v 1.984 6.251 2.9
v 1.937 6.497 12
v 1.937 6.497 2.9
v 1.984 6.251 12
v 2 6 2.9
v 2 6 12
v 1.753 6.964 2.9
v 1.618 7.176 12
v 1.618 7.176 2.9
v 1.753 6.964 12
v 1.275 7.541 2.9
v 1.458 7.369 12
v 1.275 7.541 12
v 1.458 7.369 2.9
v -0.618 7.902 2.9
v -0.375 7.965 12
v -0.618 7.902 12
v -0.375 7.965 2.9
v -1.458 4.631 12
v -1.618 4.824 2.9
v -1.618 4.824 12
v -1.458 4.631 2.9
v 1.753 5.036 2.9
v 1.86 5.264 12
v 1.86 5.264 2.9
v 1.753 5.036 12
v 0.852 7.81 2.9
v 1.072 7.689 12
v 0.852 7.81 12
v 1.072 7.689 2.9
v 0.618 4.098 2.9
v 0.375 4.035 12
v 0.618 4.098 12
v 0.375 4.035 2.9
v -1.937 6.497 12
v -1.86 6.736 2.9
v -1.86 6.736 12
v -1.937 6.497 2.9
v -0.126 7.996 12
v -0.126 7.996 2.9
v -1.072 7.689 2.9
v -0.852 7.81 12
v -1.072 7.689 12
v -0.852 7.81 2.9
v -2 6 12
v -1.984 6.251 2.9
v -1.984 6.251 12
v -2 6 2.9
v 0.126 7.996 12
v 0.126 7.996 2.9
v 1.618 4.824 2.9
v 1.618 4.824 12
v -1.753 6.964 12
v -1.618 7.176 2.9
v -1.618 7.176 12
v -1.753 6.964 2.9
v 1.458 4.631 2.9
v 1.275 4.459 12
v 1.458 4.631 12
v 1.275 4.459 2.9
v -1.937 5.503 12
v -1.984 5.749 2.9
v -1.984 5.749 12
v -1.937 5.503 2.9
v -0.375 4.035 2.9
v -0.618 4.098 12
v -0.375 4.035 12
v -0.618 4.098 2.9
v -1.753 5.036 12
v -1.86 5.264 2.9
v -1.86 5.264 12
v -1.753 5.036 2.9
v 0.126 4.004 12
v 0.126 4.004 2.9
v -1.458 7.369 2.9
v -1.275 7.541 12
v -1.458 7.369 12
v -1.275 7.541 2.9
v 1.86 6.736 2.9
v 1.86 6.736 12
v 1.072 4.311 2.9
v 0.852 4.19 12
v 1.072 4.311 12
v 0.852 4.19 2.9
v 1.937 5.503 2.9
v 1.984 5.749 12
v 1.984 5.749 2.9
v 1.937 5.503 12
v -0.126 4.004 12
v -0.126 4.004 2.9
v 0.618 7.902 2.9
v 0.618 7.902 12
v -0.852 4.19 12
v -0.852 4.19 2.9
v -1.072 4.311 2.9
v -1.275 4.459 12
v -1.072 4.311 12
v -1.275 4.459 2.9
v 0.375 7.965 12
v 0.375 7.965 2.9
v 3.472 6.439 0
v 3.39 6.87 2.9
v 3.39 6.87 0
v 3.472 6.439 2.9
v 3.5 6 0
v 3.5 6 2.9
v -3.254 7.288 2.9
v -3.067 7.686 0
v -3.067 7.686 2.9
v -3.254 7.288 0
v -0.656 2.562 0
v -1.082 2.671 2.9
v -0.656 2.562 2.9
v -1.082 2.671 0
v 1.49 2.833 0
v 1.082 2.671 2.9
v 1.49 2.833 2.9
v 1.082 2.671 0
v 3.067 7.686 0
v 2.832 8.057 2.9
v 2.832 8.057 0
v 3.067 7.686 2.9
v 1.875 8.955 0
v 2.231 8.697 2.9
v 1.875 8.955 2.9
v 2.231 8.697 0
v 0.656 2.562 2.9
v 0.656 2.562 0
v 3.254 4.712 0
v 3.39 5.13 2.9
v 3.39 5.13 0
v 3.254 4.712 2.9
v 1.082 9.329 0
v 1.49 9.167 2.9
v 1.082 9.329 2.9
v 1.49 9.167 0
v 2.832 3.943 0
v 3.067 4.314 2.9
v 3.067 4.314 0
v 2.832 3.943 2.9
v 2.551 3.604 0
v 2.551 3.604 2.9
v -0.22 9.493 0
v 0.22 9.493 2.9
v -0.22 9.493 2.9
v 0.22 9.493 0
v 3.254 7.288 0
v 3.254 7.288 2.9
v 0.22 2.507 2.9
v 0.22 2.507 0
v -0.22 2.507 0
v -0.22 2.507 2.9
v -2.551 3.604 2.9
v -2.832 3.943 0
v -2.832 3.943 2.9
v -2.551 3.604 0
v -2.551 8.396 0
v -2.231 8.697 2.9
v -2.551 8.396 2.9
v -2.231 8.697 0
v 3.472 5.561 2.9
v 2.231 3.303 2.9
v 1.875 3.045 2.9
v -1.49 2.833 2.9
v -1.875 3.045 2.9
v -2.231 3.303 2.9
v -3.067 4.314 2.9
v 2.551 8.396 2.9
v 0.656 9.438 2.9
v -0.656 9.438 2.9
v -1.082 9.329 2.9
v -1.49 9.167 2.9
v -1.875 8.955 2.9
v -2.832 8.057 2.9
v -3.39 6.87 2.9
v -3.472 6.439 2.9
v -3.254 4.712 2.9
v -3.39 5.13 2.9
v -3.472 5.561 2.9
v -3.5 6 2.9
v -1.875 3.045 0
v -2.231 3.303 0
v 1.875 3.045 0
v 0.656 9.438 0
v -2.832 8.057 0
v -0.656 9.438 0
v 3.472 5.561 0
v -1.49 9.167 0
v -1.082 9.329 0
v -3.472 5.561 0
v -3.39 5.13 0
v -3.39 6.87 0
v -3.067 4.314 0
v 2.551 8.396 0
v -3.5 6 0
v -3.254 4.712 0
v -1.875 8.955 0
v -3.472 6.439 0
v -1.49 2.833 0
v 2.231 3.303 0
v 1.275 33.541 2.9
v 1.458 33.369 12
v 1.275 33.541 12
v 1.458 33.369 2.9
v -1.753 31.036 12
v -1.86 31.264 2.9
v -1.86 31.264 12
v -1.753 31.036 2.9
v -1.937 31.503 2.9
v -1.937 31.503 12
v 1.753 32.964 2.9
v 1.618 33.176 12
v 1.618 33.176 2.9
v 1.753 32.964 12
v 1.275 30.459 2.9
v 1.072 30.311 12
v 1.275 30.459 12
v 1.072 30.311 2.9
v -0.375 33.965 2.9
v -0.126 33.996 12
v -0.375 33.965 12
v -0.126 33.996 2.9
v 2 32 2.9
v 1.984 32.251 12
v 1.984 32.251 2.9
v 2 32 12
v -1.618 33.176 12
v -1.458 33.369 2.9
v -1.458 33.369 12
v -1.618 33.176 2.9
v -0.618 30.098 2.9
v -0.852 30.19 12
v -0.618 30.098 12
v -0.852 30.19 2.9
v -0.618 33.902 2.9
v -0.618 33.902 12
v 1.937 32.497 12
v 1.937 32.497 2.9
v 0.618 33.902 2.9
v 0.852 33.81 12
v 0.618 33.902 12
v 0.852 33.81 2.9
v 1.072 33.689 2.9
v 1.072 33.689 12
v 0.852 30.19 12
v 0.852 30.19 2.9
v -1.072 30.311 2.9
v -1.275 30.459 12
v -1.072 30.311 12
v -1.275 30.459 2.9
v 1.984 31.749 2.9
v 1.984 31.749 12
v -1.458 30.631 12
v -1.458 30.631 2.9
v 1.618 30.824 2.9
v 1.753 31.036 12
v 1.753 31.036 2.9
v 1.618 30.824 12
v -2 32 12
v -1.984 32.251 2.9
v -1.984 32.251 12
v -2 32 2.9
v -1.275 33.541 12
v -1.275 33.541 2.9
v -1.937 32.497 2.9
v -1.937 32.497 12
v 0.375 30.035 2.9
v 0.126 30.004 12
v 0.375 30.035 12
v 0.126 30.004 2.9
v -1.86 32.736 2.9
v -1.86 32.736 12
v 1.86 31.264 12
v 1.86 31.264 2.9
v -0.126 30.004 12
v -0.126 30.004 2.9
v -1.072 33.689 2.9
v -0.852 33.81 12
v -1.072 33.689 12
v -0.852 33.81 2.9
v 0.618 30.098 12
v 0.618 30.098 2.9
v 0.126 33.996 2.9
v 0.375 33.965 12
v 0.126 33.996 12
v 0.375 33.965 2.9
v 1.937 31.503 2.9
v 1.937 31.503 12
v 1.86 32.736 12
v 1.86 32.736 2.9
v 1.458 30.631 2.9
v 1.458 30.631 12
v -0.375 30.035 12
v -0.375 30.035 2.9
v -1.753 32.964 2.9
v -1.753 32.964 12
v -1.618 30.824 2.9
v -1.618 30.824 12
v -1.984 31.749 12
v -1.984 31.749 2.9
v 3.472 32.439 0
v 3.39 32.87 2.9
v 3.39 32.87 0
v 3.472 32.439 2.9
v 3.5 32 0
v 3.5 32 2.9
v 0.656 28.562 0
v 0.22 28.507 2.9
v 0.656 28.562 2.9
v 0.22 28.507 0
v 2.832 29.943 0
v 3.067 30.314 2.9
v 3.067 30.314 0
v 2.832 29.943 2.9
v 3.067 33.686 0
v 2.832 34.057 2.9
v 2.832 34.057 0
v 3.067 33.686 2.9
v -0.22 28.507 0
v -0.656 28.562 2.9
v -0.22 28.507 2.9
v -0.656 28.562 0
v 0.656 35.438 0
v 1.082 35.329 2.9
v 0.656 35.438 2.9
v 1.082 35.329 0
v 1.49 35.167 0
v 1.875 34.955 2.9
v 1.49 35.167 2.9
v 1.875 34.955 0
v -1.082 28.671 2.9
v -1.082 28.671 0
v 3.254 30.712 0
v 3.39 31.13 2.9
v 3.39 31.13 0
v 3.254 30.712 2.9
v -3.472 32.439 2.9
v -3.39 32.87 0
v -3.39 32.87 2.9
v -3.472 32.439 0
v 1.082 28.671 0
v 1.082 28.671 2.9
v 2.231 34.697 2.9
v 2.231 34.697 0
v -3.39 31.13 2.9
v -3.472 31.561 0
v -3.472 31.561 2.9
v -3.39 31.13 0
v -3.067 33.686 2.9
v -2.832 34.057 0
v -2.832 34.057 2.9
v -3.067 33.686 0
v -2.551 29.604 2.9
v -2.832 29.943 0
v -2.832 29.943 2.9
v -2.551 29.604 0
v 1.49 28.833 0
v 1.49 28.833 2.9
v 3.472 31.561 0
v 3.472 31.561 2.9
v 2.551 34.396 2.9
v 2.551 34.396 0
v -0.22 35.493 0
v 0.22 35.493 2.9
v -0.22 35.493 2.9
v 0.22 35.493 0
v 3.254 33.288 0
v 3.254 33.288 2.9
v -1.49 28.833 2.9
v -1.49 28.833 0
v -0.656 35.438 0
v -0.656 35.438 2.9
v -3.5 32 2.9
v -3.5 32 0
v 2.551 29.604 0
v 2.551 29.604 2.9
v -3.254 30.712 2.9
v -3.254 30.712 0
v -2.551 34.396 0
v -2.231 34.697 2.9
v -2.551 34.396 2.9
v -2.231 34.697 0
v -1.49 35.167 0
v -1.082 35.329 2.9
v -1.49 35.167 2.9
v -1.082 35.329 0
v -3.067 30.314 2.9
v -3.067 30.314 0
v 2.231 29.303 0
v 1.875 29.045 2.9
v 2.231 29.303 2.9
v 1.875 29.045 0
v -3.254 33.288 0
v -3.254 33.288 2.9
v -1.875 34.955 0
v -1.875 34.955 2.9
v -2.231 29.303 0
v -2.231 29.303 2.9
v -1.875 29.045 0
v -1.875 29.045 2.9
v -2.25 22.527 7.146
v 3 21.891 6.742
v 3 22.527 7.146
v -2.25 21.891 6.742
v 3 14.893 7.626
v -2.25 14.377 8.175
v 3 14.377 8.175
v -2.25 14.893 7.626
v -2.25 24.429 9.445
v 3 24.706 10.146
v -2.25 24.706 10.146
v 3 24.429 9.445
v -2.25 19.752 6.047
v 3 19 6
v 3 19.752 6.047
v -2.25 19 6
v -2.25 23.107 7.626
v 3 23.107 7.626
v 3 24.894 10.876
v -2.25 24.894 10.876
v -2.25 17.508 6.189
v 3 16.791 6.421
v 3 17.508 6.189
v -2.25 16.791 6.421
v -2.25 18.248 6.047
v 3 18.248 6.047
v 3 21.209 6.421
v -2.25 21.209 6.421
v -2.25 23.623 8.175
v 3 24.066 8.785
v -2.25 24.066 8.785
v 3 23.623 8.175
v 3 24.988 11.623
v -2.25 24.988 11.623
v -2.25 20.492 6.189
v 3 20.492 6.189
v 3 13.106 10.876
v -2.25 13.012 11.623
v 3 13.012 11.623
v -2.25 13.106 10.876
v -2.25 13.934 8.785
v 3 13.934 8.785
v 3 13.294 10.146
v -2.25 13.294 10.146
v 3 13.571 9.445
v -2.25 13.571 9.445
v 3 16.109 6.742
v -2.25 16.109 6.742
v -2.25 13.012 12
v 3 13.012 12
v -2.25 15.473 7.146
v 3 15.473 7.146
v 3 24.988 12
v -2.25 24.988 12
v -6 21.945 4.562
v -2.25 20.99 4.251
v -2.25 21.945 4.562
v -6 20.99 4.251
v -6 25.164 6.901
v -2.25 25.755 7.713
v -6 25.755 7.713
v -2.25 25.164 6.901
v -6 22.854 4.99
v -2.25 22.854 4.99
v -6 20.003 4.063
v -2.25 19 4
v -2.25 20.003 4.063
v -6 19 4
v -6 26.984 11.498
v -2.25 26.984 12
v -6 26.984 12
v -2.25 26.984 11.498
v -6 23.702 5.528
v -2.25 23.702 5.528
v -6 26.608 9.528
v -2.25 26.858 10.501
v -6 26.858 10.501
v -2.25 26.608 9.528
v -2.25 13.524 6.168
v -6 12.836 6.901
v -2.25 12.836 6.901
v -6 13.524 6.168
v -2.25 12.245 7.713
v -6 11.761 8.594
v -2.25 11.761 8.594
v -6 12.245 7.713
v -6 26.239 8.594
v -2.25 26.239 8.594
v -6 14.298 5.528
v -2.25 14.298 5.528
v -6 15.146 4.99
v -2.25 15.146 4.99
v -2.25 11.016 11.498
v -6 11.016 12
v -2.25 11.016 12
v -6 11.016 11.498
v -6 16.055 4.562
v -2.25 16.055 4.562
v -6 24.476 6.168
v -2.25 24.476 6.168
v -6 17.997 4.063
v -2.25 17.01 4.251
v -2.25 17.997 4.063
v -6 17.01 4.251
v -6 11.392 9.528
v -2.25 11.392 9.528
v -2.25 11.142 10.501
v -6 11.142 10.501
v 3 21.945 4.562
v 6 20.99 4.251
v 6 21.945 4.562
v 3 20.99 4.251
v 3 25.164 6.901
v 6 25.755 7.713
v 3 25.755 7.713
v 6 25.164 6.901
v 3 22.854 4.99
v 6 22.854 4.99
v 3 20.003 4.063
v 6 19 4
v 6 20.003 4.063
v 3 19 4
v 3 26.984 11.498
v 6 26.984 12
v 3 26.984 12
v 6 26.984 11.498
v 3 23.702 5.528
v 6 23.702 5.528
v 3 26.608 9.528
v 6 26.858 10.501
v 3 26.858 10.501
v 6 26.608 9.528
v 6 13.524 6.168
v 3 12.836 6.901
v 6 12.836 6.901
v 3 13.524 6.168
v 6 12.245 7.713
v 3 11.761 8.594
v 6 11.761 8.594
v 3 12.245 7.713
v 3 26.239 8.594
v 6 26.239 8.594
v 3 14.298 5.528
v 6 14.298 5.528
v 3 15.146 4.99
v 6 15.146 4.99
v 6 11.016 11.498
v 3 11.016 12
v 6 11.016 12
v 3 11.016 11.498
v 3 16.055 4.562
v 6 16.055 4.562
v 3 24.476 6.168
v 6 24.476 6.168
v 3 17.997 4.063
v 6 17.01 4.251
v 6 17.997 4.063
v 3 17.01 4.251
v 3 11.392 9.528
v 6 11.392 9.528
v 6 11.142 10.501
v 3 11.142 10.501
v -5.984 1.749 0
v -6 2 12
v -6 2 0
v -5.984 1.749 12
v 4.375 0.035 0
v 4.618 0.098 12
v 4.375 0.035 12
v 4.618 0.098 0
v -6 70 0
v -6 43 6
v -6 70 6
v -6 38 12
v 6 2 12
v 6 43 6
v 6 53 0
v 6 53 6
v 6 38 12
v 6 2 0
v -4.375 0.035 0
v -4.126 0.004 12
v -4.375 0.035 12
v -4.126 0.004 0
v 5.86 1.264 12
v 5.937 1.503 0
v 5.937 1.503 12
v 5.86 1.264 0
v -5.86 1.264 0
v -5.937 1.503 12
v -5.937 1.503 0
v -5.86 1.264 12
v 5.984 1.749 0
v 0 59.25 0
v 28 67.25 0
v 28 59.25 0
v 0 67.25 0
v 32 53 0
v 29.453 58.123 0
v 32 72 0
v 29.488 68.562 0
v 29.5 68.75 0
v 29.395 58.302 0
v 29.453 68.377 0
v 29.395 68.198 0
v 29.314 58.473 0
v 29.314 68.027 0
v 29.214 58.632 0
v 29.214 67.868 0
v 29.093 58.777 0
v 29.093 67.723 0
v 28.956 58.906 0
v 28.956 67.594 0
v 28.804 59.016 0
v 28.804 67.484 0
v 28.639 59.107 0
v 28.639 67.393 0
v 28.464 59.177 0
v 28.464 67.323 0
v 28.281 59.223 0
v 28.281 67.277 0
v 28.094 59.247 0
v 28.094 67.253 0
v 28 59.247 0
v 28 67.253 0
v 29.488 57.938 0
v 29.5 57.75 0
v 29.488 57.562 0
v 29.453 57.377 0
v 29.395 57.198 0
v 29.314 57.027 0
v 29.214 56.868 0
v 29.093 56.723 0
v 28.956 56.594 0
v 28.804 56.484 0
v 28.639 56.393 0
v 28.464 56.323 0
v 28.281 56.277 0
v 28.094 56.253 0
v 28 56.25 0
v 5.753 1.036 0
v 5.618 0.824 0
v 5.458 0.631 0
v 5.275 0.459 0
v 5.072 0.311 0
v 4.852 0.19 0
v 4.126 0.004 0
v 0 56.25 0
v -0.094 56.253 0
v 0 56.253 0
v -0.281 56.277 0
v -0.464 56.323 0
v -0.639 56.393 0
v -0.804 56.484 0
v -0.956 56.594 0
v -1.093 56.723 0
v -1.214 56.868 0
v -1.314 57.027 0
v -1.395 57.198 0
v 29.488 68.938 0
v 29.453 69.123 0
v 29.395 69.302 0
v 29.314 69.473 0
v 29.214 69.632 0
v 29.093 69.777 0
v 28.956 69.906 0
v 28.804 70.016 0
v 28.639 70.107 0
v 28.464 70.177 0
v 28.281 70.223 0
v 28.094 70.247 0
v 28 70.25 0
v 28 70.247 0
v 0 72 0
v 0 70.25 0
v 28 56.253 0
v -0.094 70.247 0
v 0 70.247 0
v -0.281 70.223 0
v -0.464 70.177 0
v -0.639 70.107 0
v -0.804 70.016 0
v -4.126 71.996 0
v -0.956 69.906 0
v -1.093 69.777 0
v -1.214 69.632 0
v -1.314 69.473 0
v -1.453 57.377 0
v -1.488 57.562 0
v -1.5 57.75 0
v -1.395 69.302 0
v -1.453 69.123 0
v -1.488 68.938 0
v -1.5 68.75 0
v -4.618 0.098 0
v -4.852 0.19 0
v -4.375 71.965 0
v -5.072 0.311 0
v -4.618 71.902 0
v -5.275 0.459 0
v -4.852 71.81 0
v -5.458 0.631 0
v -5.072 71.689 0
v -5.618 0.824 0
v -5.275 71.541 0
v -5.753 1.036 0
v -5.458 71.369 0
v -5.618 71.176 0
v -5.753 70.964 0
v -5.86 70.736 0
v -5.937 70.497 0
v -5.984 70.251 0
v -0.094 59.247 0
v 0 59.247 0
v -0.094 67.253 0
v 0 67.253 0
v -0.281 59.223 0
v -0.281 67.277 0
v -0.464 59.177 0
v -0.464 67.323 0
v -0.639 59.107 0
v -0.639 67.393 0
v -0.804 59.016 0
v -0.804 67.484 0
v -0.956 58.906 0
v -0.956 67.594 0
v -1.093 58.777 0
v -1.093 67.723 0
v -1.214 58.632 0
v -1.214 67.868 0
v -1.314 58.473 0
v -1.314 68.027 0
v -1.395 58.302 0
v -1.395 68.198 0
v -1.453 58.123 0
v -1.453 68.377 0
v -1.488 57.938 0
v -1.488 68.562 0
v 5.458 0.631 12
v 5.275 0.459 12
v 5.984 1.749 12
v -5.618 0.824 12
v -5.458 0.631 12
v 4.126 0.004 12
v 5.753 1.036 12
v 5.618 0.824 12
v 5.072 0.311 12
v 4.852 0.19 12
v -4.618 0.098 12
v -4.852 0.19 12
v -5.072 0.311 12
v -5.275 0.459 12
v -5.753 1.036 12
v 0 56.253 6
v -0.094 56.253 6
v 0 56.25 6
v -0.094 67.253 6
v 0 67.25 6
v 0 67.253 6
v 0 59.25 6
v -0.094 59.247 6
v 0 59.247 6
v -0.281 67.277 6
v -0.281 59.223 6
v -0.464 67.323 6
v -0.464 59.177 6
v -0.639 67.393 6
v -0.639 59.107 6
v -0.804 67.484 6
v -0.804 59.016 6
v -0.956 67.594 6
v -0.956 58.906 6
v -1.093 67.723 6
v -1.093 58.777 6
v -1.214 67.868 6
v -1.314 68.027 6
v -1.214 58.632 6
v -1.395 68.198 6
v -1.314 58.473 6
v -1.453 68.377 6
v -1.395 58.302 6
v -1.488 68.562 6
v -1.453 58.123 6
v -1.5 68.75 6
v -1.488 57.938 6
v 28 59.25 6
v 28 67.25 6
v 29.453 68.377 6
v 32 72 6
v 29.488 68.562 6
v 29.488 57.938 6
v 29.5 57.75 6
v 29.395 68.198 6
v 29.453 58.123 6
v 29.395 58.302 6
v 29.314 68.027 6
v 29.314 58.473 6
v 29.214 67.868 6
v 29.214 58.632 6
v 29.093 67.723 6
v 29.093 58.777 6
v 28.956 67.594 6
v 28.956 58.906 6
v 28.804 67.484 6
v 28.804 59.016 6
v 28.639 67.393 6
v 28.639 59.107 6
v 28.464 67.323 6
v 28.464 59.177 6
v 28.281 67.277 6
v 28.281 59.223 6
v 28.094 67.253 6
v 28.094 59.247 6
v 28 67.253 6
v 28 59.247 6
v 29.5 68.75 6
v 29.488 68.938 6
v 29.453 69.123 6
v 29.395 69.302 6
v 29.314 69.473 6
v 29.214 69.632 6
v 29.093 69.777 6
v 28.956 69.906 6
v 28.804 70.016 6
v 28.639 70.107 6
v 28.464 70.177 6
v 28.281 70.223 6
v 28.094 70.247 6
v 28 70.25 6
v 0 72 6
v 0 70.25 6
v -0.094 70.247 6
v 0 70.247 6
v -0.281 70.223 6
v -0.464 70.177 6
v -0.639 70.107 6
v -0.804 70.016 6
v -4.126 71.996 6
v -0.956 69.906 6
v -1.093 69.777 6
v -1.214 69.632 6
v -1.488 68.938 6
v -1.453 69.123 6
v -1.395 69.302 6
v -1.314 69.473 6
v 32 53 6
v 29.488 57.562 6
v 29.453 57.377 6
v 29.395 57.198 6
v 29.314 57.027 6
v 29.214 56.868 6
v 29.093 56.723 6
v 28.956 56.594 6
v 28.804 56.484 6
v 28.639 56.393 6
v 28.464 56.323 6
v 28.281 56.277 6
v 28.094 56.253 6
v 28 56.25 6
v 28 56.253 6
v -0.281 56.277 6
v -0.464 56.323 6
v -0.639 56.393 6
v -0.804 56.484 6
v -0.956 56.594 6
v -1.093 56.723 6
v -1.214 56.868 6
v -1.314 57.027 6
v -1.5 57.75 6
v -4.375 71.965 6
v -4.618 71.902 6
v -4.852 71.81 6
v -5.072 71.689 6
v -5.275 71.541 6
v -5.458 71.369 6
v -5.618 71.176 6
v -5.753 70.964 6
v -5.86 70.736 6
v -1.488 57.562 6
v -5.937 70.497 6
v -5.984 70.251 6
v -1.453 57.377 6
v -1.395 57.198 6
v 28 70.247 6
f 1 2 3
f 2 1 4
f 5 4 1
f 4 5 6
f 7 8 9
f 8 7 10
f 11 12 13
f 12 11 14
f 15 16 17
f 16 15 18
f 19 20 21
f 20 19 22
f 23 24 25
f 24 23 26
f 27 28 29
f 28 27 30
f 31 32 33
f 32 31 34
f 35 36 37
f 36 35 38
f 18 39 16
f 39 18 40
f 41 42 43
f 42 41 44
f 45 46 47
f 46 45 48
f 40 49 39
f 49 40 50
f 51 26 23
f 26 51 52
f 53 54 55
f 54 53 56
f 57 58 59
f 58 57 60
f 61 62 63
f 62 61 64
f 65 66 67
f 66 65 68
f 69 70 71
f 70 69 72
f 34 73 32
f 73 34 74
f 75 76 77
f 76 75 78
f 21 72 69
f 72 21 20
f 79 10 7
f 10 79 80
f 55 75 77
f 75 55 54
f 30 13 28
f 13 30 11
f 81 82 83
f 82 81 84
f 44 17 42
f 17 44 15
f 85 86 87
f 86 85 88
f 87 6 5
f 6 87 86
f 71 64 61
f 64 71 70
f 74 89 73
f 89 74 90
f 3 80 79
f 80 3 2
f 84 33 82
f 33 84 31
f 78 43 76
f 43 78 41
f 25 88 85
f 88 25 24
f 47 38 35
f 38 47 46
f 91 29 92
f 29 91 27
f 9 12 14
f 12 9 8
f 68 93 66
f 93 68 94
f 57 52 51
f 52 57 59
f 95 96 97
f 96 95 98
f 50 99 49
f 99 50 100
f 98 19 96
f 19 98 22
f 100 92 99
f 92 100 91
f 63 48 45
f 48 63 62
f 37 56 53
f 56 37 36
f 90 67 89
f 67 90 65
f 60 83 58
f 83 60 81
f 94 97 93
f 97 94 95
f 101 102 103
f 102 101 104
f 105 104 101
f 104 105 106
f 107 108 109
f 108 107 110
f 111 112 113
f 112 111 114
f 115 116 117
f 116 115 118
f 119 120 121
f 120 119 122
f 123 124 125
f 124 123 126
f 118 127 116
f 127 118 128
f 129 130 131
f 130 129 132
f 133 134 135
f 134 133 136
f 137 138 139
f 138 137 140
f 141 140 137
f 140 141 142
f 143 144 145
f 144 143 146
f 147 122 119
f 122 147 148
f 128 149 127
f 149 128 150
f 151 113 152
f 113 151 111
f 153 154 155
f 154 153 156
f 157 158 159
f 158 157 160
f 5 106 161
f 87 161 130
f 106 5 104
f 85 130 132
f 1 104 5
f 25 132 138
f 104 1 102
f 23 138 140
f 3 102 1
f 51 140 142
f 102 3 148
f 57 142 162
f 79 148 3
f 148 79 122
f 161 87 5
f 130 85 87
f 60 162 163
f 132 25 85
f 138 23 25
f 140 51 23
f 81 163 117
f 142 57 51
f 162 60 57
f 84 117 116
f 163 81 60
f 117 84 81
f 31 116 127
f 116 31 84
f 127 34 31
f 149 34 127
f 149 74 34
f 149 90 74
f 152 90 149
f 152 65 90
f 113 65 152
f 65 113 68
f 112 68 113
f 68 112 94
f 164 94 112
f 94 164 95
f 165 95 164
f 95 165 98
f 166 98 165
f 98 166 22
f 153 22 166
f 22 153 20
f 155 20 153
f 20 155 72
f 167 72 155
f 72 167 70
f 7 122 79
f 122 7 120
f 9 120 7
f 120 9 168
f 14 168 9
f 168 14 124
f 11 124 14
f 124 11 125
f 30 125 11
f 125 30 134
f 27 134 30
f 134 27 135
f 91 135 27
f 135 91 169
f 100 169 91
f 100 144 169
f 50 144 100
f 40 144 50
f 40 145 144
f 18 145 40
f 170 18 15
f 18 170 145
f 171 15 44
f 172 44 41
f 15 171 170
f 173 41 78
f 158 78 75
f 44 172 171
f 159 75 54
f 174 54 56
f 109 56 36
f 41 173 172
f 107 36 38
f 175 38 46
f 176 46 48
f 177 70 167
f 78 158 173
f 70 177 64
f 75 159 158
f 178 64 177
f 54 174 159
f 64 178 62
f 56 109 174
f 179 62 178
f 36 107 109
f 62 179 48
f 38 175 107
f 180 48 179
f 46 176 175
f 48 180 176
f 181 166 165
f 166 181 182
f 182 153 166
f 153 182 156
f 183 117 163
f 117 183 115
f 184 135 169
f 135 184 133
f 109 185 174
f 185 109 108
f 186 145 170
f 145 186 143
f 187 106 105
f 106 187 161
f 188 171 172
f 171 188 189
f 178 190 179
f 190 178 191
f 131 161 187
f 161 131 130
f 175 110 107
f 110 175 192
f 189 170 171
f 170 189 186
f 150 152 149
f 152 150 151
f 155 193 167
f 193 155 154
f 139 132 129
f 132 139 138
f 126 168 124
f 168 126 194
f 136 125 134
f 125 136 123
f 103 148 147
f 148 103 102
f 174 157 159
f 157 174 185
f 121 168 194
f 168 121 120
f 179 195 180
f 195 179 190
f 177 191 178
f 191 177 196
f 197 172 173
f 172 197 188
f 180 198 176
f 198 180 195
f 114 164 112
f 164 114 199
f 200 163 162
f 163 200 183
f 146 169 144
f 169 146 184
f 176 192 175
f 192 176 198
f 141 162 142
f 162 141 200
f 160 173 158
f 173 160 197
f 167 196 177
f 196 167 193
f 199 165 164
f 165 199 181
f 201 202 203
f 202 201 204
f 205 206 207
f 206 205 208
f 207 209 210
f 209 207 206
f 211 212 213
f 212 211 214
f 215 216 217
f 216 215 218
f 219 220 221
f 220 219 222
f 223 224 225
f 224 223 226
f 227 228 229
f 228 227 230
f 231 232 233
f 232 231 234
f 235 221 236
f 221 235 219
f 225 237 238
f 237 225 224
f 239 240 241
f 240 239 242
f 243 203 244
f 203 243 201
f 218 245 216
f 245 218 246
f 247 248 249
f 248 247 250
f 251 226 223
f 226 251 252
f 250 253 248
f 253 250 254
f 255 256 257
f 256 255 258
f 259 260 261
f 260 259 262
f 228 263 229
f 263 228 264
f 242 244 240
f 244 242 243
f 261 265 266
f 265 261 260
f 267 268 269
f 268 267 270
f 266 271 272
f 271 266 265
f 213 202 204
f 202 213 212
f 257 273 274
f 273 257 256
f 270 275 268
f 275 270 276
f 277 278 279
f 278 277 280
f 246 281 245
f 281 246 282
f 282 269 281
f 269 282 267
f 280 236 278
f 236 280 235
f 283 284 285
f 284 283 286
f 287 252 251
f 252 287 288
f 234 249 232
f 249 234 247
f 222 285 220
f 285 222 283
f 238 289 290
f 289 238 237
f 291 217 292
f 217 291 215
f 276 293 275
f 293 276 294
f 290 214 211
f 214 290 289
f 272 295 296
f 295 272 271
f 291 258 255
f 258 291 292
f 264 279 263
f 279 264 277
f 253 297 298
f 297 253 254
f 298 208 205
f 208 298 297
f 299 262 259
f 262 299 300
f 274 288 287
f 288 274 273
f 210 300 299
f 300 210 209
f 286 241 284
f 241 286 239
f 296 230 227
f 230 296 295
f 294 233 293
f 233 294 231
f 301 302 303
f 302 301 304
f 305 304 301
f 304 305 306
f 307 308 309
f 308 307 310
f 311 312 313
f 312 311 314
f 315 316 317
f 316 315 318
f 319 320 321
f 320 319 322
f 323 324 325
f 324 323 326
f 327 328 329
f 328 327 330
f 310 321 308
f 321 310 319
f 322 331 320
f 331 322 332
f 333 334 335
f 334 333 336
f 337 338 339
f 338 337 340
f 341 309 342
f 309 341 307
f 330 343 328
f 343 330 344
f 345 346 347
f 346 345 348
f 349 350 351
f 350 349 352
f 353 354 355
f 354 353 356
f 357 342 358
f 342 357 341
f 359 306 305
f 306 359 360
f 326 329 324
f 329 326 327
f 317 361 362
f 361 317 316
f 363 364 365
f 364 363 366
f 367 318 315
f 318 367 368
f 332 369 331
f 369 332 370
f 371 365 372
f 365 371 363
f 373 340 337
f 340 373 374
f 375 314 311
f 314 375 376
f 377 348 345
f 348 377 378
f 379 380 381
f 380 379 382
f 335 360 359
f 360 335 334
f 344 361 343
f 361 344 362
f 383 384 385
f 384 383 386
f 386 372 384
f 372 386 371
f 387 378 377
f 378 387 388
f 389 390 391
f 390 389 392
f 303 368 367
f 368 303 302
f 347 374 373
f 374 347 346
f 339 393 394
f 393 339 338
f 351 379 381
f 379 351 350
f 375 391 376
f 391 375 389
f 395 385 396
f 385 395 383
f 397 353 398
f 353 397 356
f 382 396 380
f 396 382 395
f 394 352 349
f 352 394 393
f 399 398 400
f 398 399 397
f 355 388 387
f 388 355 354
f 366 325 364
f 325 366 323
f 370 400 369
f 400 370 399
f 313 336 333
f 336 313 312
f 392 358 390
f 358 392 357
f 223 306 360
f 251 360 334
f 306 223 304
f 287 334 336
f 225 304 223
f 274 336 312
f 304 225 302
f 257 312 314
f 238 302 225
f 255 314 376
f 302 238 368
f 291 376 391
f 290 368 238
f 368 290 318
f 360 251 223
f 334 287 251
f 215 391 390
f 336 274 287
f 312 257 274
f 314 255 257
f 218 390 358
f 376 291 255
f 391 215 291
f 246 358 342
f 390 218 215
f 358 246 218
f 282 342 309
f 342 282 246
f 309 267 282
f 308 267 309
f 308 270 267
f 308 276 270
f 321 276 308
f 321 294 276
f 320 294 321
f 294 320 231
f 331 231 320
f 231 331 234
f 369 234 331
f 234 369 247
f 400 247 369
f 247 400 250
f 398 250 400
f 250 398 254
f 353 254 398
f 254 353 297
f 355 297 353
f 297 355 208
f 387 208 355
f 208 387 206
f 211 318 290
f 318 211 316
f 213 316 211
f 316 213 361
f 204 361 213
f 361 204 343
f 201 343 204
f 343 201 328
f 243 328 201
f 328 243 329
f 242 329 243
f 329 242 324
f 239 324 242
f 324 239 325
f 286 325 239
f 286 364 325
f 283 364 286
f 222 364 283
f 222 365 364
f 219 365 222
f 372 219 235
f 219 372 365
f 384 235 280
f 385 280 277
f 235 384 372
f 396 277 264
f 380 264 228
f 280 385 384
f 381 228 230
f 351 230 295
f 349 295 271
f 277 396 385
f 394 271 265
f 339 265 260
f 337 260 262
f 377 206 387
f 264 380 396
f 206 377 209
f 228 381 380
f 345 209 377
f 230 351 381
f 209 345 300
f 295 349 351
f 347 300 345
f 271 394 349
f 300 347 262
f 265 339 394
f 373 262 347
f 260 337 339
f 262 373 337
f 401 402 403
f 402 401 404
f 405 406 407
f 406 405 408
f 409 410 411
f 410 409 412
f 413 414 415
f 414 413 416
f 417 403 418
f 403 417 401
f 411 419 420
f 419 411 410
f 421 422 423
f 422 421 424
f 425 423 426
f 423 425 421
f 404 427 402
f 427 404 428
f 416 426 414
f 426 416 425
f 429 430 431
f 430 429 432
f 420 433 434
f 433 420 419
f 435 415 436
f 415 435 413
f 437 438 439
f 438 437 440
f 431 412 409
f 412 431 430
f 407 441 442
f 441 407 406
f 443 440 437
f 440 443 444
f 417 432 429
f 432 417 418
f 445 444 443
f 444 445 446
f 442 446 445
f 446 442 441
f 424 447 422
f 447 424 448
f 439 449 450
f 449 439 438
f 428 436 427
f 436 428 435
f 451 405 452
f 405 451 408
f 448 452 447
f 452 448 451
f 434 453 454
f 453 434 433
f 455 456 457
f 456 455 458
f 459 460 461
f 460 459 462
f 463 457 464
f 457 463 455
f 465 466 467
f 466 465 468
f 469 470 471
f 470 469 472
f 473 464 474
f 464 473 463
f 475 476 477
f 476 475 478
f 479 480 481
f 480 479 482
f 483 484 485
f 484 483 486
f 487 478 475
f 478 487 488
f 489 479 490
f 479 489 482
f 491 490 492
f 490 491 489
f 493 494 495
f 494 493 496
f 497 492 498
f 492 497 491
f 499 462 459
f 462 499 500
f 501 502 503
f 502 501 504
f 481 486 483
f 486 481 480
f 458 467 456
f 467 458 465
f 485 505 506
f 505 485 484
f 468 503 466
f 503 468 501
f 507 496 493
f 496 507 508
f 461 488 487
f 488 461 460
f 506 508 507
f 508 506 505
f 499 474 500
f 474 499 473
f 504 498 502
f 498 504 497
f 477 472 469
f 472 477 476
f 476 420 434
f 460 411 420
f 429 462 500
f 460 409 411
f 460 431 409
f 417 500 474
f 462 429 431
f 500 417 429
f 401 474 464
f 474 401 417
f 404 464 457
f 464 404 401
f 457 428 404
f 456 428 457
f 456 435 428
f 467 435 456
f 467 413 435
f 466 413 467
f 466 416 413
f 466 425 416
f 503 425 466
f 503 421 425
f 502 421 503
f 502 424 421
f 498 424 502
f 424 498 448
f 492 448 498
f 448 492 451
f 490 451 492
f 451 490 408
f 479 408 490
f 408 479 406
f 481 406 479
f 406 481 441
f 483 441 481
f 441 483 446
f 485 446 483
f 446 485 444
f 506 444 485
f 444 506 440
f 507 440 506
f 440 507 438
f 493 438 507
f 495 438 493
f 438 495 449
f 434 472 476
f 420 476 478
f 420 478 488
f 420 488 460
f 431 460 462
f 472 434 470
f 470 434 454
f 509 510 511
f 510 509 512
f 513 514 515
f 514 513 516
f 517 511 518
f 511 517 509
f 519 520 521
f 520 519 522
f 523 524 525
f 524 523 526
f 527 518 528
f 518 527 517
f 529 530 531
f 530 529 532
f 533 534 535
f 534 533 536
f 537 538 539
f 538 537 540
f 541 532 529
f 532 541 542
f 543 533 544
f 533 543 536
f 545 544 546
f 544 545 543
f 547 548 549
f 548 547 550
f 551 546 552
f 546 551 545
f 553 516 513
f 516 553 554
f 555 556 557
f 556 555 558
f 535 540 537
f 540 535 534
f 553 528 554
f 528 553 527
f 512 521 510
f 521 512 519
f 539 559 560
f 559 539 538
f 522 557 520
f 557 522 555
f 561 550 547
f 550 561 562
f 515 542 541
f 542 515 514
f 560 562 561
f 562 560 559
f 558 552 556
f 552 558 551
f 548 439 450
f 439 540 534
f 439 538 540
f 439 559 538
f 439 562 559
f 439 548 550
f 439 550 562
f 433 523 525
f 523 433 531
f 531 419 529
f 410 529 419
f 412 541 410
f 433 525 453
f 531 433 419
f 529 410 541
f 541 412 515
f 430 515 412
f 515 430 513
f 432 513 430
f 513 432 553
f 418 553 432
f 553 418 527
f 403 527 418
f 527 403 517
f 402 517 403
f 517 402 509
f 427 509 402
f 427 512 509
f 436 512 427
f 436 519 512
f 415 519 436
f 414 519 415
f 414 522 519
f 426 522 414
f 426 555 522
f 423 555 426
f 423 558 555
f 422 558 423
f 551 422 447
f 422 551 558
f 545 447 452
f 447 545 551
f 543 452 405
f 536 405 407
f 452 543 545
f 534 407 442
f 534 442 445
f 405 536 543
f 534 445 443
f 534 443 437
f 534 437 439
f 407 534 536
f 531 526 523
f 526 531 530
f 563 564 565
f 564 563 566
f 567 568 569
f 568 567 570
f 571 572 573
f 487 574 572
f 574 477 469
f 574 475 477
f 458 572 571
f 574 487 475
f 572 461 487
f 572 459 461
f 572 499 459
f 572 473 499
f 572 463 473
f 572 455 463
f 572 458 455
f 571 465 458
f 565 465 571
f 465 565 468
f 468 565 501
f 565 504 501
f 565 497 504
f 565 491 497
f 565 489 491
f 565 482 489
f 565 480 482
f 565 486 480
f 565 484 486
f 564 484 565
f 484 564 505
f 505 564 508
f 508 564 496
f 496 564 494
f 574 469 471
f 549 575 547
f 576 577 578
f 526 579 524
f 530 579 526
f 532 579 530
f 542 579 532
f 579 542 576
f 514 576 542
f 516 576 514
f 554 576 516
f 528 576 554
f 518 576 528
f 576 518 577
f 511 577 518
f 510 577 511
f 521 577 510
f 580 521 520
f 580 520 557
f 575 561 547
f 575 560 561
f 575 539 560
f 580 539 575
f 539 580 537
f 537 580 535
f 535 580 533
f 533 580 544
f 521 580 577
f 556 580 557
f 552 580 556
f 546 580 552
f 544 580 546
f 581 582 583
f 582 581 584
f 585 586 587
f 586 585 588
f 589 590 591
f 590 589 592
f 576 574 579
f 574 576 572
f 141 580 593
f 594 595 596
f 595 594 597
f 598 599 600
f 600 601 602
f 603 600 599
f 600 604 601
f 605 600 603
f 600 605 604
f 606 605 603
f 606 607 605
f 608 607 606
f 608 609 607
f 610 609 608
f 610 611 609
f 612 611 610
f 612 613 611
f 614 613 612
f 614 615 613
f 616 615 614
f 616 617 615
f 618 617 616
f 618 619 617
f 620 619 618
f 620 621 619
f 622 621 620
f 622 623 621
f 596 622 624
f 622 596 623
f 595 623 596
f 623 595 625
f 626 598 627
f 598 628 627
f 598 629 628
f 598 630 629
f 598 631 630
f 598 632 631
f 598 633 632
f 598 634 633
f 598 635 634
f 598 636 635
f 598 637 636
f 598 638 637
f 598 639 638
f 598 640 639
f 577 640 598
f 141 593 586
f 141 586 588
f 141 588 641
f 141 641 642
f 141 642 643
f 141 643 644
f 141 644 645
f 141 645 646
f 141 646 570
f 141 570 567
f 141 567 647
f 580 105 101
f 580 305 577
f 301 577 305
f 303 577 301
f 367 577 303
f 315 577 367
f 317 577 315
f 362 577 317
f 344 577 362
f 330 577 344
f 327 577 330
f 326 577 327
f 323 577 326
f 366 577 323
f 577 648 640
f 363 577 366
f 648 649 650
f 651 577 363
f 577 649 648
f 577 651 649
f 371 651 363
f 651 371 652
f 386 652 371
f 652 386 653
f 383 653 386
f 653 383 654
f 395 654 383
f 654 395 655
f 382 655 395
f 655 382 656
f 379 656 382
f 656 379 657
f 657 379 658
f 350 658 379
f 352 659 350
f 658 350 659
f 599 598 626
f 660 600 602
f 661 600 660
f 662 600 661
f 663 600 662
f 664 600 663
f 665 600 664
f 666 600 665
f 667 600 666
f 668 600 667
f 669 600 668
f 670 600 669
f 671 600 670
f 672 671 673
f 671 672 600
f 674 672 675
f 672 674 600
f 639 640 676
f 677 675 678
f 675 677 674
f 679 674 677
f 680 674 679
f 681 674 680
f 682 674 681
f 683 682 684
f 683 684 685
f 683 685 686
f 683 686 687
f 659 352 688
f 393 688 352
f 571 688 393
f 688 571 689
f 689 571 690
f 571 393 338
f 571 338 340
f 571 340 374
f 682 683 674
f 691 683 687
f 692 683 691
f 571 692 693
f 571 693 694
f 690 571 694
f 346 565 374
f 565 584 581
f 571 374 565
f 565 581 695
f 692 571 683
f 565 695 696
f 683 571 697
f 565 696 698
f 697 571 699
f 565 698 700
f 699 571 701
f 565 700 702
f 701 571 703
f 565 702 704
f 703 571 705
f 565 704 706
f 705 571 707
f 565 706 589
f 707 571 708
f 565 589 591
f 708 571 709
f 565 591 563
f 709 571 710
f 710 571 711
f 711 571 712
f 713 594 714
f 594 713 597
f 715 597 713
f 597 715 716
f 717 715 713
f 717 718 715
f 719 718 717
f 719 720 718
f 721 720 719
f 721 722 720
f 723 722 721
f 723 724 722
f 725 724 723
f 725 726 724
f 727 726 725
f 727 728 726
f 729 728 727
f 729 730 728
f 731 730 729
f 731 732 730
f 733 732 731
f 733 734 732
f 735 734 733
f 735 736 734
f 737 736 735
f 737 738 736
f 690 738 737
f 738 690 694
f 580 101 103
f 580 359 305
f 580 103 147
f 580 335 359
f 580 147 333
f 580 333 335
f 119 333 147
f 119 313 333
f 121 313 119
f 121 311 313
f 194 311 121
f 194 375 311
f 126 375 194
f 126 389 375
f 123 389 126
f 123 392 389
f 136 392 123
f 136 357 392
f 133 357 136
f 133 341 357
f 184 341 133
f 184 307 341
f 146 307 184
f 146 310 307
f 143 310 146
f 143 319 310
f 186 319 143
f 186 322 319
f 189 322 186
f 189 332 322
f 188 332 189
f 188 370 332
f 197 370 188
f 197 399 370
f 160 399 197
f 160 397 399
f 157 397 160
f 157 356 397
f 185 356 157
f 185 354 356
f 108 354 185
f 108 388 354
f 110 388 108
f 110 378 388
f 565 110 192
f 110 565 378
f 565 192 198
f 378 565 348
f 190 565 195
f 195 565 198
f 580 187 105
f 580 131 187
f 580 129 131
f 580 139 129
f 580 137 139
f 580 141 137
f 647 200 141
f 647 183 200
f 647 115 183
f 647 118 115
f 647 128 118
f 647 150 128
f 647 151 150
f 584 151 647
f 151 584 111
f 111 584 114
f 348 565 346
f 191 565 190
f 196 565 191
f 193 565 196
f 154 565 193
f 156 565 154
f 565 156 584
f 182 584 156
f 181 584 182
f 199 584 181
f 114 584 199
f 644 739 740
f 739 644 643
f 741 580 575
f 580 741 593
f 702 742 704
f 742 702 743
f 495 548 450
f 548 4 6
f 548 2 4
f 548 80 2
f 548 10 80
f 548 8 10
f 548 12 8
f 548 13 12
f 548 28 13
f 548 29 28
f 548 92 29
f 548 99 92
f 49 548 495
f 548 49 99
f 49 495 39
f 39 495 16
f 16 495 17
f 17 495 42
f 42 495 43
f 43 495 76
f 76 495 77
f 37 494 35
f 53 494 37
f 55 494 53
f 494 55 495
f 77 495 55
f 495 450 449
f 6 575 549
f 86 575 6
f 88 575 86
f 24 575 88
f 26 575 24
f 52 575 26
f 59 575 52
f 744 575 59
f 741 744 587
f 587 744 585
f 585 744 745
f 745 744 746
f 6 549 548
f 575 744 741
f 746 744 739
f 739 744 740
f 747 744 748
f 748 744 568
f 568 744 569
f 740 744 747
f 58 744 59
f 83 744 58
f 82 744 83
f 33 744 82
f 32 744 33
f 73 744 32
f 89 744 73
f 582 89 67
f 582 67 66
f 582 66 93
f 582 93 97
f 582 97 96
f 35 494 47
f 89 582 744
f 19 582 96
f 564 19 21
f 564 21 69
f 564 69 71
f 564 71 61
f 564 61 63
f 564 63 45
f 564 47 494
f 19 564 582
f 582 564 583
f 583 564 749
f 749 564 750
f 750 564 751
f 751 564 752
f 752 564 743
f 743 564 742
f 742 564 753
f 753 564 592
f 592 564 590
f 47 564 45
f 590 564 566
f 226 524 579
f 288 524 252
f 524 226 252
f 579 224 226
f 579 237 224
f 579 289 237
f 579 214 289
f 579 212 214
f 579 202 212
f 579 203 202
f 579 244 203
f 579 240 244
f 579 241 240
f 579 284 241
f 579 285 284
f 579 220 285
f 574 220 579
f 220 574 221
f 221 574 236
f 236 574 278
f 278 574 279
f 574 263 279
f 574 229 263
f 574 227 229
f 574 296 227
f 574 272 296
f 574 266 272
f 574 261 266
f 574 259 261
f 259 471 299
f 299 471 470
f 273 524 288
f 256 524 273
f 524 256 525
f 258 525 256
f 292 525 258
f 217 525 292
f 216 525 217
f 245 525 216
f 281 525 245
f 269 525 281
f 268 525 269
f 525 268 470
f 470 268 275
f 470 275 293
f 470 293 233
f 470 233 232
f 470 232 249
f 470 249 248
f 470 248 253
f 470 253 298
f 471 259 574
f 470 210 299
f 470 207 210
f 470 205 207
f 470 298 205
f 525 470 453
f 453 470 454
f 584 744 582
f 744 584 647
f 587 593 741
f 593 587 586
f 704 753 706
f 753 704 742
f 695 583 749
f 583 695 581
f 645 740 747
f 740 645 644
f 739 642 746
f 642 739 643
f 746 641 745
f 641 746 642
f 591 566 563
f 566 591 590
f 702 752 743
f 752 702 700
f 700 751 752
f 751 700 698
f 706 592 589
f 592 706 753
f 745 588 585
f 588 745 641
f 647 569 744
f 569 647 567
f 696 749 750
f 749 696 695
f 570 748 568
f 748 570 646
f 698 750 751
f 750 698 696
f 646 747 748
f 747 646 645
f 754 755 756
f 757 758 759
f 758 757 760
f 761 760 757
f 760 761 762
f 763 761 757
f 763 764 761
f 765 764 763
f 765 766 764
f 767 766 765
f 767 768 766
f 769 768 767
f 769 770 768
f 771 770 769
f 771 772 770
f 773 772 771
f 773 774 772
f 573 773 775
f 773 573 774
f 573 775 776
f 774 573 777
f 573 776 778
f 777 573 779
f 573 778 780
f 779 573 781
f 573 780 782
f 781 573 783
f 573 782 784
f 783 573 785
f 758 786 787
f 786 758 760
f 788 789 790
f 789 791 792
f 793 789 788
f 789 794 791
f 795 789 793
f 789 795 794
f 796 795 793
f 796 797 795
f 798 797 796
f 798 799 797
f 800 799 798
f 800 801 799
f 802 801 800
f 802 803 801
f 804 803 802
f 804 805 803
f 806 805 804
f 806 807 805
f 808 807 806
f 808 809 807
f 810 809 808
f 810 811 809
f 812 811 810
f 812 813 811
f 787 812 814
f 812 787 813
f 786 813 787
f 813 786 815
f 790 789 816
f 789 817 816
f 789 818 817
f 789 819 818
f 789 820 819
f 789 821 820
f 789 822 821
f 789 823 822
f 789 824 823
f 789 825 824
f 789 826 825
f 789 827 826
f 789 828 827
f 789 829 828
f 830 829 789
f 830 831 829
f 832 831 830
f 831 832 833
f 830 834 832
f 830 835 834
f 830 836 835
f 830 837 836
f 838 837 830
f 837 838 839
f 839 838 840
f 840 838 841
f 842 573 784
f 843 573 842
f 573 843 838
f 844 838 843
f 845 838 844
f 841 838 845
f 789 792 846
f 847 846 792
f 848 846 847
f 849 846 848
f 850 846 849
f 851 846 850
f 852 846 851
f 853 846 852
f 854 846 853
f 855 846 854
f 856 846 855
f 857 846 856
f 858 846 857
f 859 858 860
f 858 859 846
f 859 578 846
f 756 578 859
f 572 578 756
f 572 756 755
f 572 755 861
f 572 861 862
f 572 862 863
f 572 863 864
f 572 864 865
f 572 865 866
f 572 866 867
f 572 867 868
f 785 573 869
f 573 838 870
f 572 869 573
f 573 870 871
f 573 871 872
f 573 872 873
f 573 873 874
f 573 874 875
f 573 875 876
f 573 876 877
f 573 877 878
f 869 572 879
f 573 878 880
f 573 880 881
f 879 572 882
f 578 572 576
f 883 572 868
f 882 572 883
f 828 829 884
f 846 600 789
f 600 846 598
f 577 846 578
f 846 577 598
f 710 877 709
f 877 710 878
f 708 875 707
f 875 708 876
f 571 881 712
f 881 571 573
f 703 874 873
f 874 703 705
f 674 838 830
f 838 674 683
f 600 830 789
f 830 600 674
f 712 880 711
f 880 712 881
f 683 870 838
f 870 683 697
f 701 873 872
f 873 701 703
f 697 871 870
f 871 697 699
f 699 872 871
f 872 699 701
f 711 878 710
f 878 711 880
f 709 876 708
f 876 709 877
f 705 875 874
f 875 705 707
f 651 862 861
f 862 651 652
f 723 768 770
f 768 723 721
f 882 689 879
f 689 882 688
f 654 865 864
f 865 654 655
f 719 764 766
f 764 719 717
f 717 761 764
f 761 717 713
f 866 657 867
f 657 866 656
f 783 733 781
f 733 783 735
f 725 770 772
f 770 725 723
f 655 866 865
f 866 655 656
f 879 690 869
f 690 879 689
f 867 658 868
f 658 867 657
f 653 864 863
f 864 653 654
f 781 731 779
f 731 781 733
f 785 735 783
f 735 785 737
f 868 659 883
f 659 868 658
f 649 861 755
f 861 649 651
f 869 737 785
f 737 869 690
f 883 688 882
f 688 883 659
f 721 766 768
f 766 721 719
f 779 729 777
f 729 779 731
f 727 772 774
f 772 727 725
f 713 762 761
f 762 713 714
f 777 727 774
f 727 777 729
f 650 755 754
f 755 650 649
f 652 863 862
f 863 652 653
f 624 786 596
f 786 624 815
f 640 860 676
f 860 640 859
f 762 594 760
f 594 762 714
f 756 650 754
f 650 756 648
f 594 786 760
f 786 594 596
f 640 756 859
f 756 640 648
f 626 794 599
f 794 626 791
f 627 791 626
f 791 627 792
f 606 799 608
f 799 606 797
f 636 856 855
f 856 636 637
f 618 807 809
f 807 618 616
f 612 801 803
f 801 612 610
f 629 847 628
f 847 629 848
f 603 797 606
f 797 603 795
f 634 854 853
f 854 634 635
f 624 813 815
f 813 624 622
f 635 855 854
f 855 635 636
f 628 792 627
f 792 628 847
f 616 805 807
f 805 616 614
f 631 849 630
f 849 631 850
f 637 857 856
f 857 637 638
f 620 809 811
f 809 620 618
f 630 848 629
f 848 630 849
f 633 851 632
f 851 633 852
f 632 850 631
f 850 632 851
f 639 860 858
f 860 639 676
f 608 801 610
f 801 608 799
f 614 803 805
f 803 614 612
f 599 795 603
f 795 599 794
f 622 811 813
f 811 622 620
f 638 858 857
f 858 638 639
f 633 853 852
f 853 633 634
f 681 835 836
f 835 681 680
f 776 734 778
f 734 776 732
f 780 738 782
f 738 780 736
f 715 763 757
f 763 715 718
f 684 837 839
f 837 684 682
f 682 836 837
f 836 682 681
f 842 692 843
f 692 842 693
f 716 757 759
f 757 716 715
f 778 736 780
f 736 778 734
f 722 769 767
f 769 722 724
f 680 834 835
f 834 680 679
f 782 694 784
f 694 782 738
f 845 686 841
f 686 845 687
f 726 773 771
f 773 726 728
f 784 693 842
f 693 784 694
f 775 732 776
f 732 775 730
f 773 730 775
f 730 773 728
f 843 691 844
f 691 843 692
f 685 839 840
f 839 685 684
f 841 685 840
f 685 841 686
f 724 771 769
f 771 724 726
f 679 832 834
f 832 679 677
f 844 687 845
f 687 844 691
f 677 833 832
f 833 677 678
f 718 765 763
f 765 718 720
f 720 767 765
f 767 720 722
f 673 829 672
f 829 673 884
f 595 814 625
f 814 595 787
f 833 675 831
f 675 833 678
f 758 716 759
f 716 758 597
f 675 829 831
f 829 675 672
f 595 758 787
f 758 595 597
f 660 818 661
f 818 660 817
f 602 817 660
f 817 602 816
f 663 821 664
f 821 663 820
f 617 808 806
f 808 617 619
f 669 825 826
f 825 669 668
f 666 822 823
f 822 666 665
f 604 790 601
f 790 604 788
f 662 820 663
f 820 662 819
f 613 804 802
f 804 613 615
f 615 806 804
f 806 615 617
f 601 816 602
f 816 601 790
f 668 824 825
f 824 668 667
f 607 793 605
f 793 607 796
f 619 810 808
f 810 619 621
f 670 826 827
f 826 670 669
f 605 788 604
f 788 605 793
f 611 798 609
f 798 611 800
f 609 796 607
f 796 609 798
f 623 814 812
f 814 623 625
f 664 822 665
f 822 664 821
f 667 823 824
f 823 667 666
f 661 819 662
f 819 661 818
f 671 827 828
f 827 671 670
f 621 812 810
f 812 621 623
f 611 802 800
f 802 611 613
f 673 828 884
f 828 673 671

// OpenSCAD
/********************************************************************
 * Author: Mekatrol
 * http://www.thingiverse.com/mekatrol
 *
 * Thanks to TECH2C:
 * http://www.thingiverse.com/Tech2C	
 * https://www.youtube.com/channel/UC_scf0U4iSELX22nC60WDSg
 *
 * NOTES:
 * 	1. All dimensions are in mm (millimetres).
 *  2. Hulls are used to form complex shapes. Change the hull keyword 
 *     to union to see the primitive shapes for debugging.
 *
 ********************************************************************/

// Made of of 3 sections:
// 1. The extruder clamp. 
//    This is the section that clamps to the 
//    Tech2C extruder mount (throat clamp).
//
// 2. Sensor mount.
//    This section containes the send platform and hole.
//
// 3. Connector section.
//    This section connects the extruder clamp
//    to the sensor mount (connects sections 1 & 2).

/*********************************************************
 * Global variables.
 *********************************************************/

// Increase this value to improve 'roundness' resoultion.
$fn = 50;

// Type of sensor mount 
// 1 = circular 
// 2 = Block type 
sensorMountType = 2;

// Sensor mount position
// 1 = Left
// 2 = Right
sensorMountPosition = 1;

// Set the nominal diameter of the sensor body.
sensorDiameter = 12;

// The multiplier user to make sure extrude cuts
// go all the way through a solid.
extrudeCutFactor = 0.1;

// The diameters of the extruder throat.
smallThroatDiameter = 12;
largeThroatDiameter = 16;

// Clamp screw dimensions
clampScrewDiameter = 4;
clampScrewCenterOffset = 13;
clampScrewRim = 3;
// Hieght of the screw head
clampScrewHeight = 3;

// The cut depths for the large throat diameters.
topThroatCutDepth = 3.75;
bottomThroatCutDepth = 3;

// Width, height of the clamp section.
clampSectionWidth = 12;  // X size
clampSectionLength = 38; // Y size 
clampSectionHeight = 12; // Z size

// Length of angled section in the Y dimension.
clampAngleFaceLength = 5; // Y size

// Sensor mount sizes
sensorMountWidth = clampSectionHeight / 2; // X size
sensorMountLength = 25; // Y size
sensorMountHeight = 32.5; // Z size

blockSensorMountExtraWidth = 10;
blockSensorHoleDist = 11;
blockSensorRimSize = 5;

// Sensor corner radiuses.
cornerMajorRadius = 12;
cornerMinorRadius = 6;		

// Offset of sensor hole from bottom of mount.
sensorHoleOffset = 20.5;

// The radius of major corners.
cornerRadius = 2;

// The connector section size
connectorSectionWidth = 38; // X size
connectorSectionLength = 12;  // Y size 

connectorSectionHeight = sensorMountWidth; // Z size

// Connector hole sizes
connectorHoleDiameter = 3;
connectorHoleOffset = 7.5;

// Size of bevel between sensor mount section and
// connector section.
bevelSize = 5;

/*********************************************************
 * Section construction.
 *********************************************************/


union()
{
	ExtruderClampSection();
    if (sensorMountType == 1) {
        if (sensorMountPosition == 2) {
             rotate([0,180,0]) {
                    translate([0,0,-sensorMountWidth]) {
                        rotate([180,0,0]) {
                             translate([0, 
        -2*(clampSectionLength +
            clampAngleFaceLength +
            connectorSectionLength / 2), 
        -connectorSectionHeight]) {
                            SensorMountSection(); 
        }
                        }
                        ConnectorSection();
                    }
             }
         } else {
             SensorMountSection();
             ConnectorSection();
         }
    } else {
        if (sensorMountPosition == 2) {
            rotate([0,180,0]) {
                translate([0,0,-sensorMountWidth]) {
                    BlockConnectorSection();
                }
            }
        } else {
            BlockConnectorSection();
        }
    }
	
}

module ExtruderClampSection()
{
	// Section body.	
	difference()
	{
		// Solid section
		hull()
		{
			// Rounded corner 1
			translate([
				-clampSectionWidth / 2 + cornerRadius, 
				 cornerRadius, 0]) 
			{	
				cylinder(
					r = cornerRadius, 
					h = clampSectionHeight);
			}
			
			// Rounded corner 2
			translate([
				+clampSectionWidth / 2 - cornerRadius, 
				 cornerRadius, 0]) 
			{
				cylinder(
					r = cornerRadius, 
					h = clampSectionHeight);
			}
			
			// Section body cube
			translate([
				-clampSectionWidth / 2, 
				cornerRadius, 0])
			{
				cube(size = [
					clampSectionWidth, 
					clampSectionLength - cornerRadius, 
					clampSectionHeight]);
			}

			// Section between clamp and connector section.
			translate([0, clampSectionLength, 0])
			{
				rotate([0, -90, 0])
				{
					// Angled face section to connector.
					linear_extrude(
						height = clampSectionWidth, 
						center = true)
					{
						polygon(points = [
							[0, 0],
							[clampSectionHeight, 0],
							[clampSectionHeight / 2, clampAngleFaceLength],
							[0,  clampAngleFaceLength]
						]);
					}
				}
			}
		}
		
		union()
		{
			// Clamp screw hole 1.
			translate([
				0, 
				clampSectionLength / 2 - clampScrewCenterOffset, 
				-extrudeCutFactor])
				{
					cylinder(
						d = clampScrewDiameter,
						h = clampSectionHeight + 2 * extrudeCutFactor);
                    cylinder(
						d = clampScrewDiameter + clampScrewRim,
						h = clampScrewHeight );
			}
			
			// Clamp screw hole 2.
			translate([
				0, 
				clampSectionLength / 2 + clampScrewCenterOffset, 
				-extrudeCutFactor])
				{
					cylinder(
						d = clampScrewDiameter,
						h = clampSectionHeight + 2 * extrudeCutFactor);
                    cylinder(
						d = clampScrewDiameter + clampScrewRim,
						h = clampScrewHeight );
			}

			// Small throat diameter hole.
			translate([
				0,
				clampSectionLength / 2,
				clampSectionHeight])
				{
					rotate([0, 90, 0])
					{
						cylinder(
							d = smallThroatDiameter,
							h = clampSectionWidth + 2 * extrudeCutFactor,
							center = true);
				}
			}
			
			// Large throat diameter top extrude cut.
			topExtrudeSize = topThroatCutDepth + 2 * extrudeCutFactor;
			translate([
				-clampSectionWidth / 2 - 
					(topExtrudeSize - topThroatCutDepth),
				clampSectionLength / 2,
				clampSectionHeight])
				{
					rotate([0, 90, 0])
					{
						cylinder(
							d = largeThroatDiameter,
							h = topExtrudeSize);
				}
			}

			// Large throat diameter bottom extrude cut.
			translate([
				clampSectionWidth / 2 - bottomThroatCutDepth, 
				clampSectionLength / 2, 
				clampSectionHeight])
				{
					rotate([0, 90, 0])
					{
						cylinder(
							d = largeThroatDiameter,
							h = bottomThroatCutDepth + 2 * extrudeCutFactor);
				}
			}
		}
	}
}

module SensorMountSection()
{
    // Bevel to sensor platform
    translate([
        connectorSectionWidth - 
            bevelSize, 
    
        clampSectionLength +
            clampAngleFaceLength +
            connectorSectionLength / 2, 
    
        connectorSectionHeight])
    {
        rotate([90, -90, 0])
        {
            // Angled face section to connector.
            linear_extrude(
                height = connectorSectionLength, 
                center = true)
            {
                polygon(points = [
                    [0, 0],
                    [bevelSize, 0],
                    [0, bevelSize]
                ]);
            }
        }
    }
	difference()
	{	
		hull()
		{
			// Top large rounded corner 1
			translate([
				connectorSectionWidth - clampSectionWidth / 2, 
			
				clampSectionLength + 
					clampAngleFaceLength - 
					sensorMountLength / 2 + 
					connectorSectionLength / 2 +
					cornerMajorRadius, 
			
				sensorMountHeight - cornerMajorRadius])
			{
				rotate([0, 90, 0])
				{
					cylinder(
						r = cornerMajorRadius,
						h = sensorMountWidth);
				}
			}

			// Top large rounded corner 2
			translate([
				connectorSectionWidth - 
					clampSectionWidth / 2,
			
				clampSectionLength +
					clampAngleFaceLength -
					sensorMountLength / 2 +
					connectorSectionLength / 2 +
					sensorMountLength -
					cornerMajorRadius,
			
				sensorMountHeight - cornerMajorRadius])
			{
				rotate([0, 90, 0])
				{
					cylinder(
						r = cornerMajorRadius,
						h = sensorMountWidth);
				}
			}

			// Bottom small rounded corner 1
			translate([
				connectorSectionWidth - 
					clampSectionWidth / 2,
				
				clampSectionLength +
					clampAngleFaceLength -
					sensorMountLength / 2 +
					connectorSectionLength / 2 +
					cornerMinorRadius,
				
				cornerMinorRadius])
			{
				rotate([0, 90, 0])
				{
					cylinder(
						r = cornerMinorRadius,
						h = sensorMountWidth);
				}
			}

			// Bottom small rounded corner 2
			translate([
				connectorSectionWidth - clampSectionWidth / 2,
				clampSectionLength +
					clampAngleFaceLength -
					sensorMountLength / 2 +
					connectorSectionLength / 2 +
					sensorMountLength -
					cornerMinorRadius,
				cornerMinorRadius])
			{
				rotate([0, 90, 0])
				{
					cylinder(
						r = cornerMinorRadius,
						h = sensorMountWidth);
				}
			}
		}

		union()
		{
			// Sensor hole.
			translate([
				connectorSectionWidth -
				clampSectionWidth / 2 -
				+extrudeCutFactor,

				clampSectionLength + 
					clampAngleFaceLength - 
					sensorMountLength / 2 + 
					connectorSectionLength / 2 +
					sensorMountLength -
					sensorDiameter, 

				sensorHoleOffset])
			{
				rotate([0, 90, 0])
				{
					cylinder(
						d = sensorDiameter,
						h = sensorMountWidth + 2 * extrudeCutFactor);
				}
			}
		}
	}
}

module ConnectorSection()
{

	difference()
	{		
		union()
		{
			hull()
			{
				// Large cube area
				translate([
					0,
					clampSectionLength + clampAngleFaceLength,
					0])
				{
					if (sensorMountType == 1) {
                    cube(size = [
						connectorSectionWidth  - clampSectionWidth / 2,
						connectorSectionLength, 
						connectorSectionHeight]);
                    } else {
                        cube(size = [
						connectorSectionWidth  - clampSectionWidth / 2,
						connectorSectionBlockLength, 
						connectorSectionHeight]);
                    }
				}		

				// Small cube area
				translate([
					-clampSectionWidth / 2,
					clampSectionLength + clampAngleFaceLength,
					0])
				{
					cube(size = [
						clampSectionWidth / 2,
						connectorSectionLength / 2,
						connectorSectionHeight]);
				}

				// Rounded corner
				translate([
					-clampSectionWidth / 2 + cornerRadius,
					 clampSectionLength +
						clampAngleFaceLength +
						connectorSectionLength - cornerRadius,
					 0])
				{
					cylinder(
						r = cornerRadius, 
						h = connectorSectionHeight);
				}
			}
			
			
		}
		
		union()
		{
			// Connector hole 1.
			translate([
				0,
				clampSectionLength +
					clampAngleFaceLength +
					connectorSectionLength / 2,
				-extrudeCutFactor])
			{
				cylinder(
					d = connectorHoleDiameter,
					h = connectorSectionHeight +
						2 * extrudeCutFactor);
			}
            if (sensorMountType == 1) {
                // Connector hole 2.
                translate([
                    connectorHoleOffset,
                    clampSectionLength +
                        clampAngleFaceLength +
                        connectorSectionLength / 2,
                    -extrudeCutFactor])
                {
                    cylinder(
                        d = connectorHoleDiameter,
                        h = connectorSectionHeight +
                            2 * extrudeCutFactor);
                }

                // Connector hole 3.
                translate([
                    connectorHoleOffset * 2,
                    clampSectionLength +
                        clampAngleFaceLength +
                        connectorSectionLength / 2,
                    -extrudeCutFactor])
                {
                    cylinder(
                        d = connectorHoleDiameter,
                        h = connectorSectionHeight +
                            2 * extrudeCutFactor);
                }
            } else {
                // Connector slot
                translate([
				0,
				clampSectionLength +
					clampAngleFaceLength +
					(connectorSectionLength / 2)-(connectorHoleDiameter / 2),
				-extrudeCutFactor])
                {
                    cube(size=[connectorHoleOffset * 3,connectorHoleDiameter,connectorSectionHeight+1]);
                }
            }

			// Connector hole 4.
			translate([
				connectorHoleOffset * 3,
				clampSectionLength + 
					clampAngleFaceLength +
					connectorSectionLength / 2,
				-extrudeCutFactor])
			{
				cylinder(
					d = connectorHoleDiameter,
					h = connectorSectionHeight +
						2 * extrudeCutFactor);
			}
		}
	}
}

module BlockConnectorSection()
{

	difference()
	{		
        connectorSectionBlockLength = blockSensorHoleDist + connectorHoleDiameter + blockSensorRimSize;
		union()
		{
            translate([
					-clampSectionWidth / 2,
					clampSectionLength + clampAngleFaceLength ,
					0])
				{
                    cube(size = [
						clampSectionWidth,
						connectorSectionBlockLength / 2 + blockSensorMountExtraWidth,
						connectorSectionHeight]);
                }
			hull()
			{
				// Large cube area
				translate([
					0,
					clampSectionLength + clampAngleFaceLength +blockSensorMountExtraWidth,
					0])
				{
                        cube(size = [
						connectorSectionWidth  - clampSectionWidth / 2,
						connectorSectionBlockLength, 
						connectorSectionHeight]);
				}		

				// Small cube area
				translate([
					-clampSectionWidth / 2,
					clampSectionLength + clampAngleFaceLength +blockSensorMountExtraWidth,
					0])
				{
					cube(size = [
						clampSectionWidth,
						connectorSectionBlockLength / 2 ,
						connectorSectionHeight]);
				}

				// Rounded corner
				translate([
					-clampSectionWidth / 2 + cornerRadius,
					 clampSectionLength +
						clampAngleFaceLength +
						connectorSectionBlockLength - cornerRadius + blockSensorMountExtraWidth,
					 0])
				{
					cylinder(
						r = cornerRadius, 
						h = connectorSectionHeight);
				}
			}
			
			
		}
        slot(clampSectionLength +
                clampAngleFaceLength +
                connectorSectionBlockLength / 4 + blockSensorMountExtraWidth);
        slot(clampSectionLength +
                clampAngleFaceLength +
                connectorSectionBlockLength / 4 + blockSensorMountExtraWidth + blockSensorHoleDist);
	}
}

module slot(x_pos) {
    union()
    {
        // Connector hole 1.
        translate([
            0,
            x_pos,
            -extrudeCutFactor])
        {
            cylinder(
                d = connectorHoleDiameter,
                h = connectorSectionHeight +
                    2 * extrudeCutFactor);
        }
        
        // Connector slot
        translate([
        0,
        x_pos-(connectorHoleDiameter / 2),
        -extrudeCutFactor])
        {
            cube(size=[clampSectionLength-blockSensorMountExtraWidth,connectorHoleDiameter,connectorSectionHeight+1]);
        }
    }

    // Connector hole 4.
    translate([
        clampSectionLength-blockSensorMountExtraWidth,
        x_pos,
        -extrudeCutFactor])
    {
        cylinder(
            d = connectorHoleDiameter,
            h = connectorSectionHeight +
                2 * extrudeCutFactor);
    }
}
